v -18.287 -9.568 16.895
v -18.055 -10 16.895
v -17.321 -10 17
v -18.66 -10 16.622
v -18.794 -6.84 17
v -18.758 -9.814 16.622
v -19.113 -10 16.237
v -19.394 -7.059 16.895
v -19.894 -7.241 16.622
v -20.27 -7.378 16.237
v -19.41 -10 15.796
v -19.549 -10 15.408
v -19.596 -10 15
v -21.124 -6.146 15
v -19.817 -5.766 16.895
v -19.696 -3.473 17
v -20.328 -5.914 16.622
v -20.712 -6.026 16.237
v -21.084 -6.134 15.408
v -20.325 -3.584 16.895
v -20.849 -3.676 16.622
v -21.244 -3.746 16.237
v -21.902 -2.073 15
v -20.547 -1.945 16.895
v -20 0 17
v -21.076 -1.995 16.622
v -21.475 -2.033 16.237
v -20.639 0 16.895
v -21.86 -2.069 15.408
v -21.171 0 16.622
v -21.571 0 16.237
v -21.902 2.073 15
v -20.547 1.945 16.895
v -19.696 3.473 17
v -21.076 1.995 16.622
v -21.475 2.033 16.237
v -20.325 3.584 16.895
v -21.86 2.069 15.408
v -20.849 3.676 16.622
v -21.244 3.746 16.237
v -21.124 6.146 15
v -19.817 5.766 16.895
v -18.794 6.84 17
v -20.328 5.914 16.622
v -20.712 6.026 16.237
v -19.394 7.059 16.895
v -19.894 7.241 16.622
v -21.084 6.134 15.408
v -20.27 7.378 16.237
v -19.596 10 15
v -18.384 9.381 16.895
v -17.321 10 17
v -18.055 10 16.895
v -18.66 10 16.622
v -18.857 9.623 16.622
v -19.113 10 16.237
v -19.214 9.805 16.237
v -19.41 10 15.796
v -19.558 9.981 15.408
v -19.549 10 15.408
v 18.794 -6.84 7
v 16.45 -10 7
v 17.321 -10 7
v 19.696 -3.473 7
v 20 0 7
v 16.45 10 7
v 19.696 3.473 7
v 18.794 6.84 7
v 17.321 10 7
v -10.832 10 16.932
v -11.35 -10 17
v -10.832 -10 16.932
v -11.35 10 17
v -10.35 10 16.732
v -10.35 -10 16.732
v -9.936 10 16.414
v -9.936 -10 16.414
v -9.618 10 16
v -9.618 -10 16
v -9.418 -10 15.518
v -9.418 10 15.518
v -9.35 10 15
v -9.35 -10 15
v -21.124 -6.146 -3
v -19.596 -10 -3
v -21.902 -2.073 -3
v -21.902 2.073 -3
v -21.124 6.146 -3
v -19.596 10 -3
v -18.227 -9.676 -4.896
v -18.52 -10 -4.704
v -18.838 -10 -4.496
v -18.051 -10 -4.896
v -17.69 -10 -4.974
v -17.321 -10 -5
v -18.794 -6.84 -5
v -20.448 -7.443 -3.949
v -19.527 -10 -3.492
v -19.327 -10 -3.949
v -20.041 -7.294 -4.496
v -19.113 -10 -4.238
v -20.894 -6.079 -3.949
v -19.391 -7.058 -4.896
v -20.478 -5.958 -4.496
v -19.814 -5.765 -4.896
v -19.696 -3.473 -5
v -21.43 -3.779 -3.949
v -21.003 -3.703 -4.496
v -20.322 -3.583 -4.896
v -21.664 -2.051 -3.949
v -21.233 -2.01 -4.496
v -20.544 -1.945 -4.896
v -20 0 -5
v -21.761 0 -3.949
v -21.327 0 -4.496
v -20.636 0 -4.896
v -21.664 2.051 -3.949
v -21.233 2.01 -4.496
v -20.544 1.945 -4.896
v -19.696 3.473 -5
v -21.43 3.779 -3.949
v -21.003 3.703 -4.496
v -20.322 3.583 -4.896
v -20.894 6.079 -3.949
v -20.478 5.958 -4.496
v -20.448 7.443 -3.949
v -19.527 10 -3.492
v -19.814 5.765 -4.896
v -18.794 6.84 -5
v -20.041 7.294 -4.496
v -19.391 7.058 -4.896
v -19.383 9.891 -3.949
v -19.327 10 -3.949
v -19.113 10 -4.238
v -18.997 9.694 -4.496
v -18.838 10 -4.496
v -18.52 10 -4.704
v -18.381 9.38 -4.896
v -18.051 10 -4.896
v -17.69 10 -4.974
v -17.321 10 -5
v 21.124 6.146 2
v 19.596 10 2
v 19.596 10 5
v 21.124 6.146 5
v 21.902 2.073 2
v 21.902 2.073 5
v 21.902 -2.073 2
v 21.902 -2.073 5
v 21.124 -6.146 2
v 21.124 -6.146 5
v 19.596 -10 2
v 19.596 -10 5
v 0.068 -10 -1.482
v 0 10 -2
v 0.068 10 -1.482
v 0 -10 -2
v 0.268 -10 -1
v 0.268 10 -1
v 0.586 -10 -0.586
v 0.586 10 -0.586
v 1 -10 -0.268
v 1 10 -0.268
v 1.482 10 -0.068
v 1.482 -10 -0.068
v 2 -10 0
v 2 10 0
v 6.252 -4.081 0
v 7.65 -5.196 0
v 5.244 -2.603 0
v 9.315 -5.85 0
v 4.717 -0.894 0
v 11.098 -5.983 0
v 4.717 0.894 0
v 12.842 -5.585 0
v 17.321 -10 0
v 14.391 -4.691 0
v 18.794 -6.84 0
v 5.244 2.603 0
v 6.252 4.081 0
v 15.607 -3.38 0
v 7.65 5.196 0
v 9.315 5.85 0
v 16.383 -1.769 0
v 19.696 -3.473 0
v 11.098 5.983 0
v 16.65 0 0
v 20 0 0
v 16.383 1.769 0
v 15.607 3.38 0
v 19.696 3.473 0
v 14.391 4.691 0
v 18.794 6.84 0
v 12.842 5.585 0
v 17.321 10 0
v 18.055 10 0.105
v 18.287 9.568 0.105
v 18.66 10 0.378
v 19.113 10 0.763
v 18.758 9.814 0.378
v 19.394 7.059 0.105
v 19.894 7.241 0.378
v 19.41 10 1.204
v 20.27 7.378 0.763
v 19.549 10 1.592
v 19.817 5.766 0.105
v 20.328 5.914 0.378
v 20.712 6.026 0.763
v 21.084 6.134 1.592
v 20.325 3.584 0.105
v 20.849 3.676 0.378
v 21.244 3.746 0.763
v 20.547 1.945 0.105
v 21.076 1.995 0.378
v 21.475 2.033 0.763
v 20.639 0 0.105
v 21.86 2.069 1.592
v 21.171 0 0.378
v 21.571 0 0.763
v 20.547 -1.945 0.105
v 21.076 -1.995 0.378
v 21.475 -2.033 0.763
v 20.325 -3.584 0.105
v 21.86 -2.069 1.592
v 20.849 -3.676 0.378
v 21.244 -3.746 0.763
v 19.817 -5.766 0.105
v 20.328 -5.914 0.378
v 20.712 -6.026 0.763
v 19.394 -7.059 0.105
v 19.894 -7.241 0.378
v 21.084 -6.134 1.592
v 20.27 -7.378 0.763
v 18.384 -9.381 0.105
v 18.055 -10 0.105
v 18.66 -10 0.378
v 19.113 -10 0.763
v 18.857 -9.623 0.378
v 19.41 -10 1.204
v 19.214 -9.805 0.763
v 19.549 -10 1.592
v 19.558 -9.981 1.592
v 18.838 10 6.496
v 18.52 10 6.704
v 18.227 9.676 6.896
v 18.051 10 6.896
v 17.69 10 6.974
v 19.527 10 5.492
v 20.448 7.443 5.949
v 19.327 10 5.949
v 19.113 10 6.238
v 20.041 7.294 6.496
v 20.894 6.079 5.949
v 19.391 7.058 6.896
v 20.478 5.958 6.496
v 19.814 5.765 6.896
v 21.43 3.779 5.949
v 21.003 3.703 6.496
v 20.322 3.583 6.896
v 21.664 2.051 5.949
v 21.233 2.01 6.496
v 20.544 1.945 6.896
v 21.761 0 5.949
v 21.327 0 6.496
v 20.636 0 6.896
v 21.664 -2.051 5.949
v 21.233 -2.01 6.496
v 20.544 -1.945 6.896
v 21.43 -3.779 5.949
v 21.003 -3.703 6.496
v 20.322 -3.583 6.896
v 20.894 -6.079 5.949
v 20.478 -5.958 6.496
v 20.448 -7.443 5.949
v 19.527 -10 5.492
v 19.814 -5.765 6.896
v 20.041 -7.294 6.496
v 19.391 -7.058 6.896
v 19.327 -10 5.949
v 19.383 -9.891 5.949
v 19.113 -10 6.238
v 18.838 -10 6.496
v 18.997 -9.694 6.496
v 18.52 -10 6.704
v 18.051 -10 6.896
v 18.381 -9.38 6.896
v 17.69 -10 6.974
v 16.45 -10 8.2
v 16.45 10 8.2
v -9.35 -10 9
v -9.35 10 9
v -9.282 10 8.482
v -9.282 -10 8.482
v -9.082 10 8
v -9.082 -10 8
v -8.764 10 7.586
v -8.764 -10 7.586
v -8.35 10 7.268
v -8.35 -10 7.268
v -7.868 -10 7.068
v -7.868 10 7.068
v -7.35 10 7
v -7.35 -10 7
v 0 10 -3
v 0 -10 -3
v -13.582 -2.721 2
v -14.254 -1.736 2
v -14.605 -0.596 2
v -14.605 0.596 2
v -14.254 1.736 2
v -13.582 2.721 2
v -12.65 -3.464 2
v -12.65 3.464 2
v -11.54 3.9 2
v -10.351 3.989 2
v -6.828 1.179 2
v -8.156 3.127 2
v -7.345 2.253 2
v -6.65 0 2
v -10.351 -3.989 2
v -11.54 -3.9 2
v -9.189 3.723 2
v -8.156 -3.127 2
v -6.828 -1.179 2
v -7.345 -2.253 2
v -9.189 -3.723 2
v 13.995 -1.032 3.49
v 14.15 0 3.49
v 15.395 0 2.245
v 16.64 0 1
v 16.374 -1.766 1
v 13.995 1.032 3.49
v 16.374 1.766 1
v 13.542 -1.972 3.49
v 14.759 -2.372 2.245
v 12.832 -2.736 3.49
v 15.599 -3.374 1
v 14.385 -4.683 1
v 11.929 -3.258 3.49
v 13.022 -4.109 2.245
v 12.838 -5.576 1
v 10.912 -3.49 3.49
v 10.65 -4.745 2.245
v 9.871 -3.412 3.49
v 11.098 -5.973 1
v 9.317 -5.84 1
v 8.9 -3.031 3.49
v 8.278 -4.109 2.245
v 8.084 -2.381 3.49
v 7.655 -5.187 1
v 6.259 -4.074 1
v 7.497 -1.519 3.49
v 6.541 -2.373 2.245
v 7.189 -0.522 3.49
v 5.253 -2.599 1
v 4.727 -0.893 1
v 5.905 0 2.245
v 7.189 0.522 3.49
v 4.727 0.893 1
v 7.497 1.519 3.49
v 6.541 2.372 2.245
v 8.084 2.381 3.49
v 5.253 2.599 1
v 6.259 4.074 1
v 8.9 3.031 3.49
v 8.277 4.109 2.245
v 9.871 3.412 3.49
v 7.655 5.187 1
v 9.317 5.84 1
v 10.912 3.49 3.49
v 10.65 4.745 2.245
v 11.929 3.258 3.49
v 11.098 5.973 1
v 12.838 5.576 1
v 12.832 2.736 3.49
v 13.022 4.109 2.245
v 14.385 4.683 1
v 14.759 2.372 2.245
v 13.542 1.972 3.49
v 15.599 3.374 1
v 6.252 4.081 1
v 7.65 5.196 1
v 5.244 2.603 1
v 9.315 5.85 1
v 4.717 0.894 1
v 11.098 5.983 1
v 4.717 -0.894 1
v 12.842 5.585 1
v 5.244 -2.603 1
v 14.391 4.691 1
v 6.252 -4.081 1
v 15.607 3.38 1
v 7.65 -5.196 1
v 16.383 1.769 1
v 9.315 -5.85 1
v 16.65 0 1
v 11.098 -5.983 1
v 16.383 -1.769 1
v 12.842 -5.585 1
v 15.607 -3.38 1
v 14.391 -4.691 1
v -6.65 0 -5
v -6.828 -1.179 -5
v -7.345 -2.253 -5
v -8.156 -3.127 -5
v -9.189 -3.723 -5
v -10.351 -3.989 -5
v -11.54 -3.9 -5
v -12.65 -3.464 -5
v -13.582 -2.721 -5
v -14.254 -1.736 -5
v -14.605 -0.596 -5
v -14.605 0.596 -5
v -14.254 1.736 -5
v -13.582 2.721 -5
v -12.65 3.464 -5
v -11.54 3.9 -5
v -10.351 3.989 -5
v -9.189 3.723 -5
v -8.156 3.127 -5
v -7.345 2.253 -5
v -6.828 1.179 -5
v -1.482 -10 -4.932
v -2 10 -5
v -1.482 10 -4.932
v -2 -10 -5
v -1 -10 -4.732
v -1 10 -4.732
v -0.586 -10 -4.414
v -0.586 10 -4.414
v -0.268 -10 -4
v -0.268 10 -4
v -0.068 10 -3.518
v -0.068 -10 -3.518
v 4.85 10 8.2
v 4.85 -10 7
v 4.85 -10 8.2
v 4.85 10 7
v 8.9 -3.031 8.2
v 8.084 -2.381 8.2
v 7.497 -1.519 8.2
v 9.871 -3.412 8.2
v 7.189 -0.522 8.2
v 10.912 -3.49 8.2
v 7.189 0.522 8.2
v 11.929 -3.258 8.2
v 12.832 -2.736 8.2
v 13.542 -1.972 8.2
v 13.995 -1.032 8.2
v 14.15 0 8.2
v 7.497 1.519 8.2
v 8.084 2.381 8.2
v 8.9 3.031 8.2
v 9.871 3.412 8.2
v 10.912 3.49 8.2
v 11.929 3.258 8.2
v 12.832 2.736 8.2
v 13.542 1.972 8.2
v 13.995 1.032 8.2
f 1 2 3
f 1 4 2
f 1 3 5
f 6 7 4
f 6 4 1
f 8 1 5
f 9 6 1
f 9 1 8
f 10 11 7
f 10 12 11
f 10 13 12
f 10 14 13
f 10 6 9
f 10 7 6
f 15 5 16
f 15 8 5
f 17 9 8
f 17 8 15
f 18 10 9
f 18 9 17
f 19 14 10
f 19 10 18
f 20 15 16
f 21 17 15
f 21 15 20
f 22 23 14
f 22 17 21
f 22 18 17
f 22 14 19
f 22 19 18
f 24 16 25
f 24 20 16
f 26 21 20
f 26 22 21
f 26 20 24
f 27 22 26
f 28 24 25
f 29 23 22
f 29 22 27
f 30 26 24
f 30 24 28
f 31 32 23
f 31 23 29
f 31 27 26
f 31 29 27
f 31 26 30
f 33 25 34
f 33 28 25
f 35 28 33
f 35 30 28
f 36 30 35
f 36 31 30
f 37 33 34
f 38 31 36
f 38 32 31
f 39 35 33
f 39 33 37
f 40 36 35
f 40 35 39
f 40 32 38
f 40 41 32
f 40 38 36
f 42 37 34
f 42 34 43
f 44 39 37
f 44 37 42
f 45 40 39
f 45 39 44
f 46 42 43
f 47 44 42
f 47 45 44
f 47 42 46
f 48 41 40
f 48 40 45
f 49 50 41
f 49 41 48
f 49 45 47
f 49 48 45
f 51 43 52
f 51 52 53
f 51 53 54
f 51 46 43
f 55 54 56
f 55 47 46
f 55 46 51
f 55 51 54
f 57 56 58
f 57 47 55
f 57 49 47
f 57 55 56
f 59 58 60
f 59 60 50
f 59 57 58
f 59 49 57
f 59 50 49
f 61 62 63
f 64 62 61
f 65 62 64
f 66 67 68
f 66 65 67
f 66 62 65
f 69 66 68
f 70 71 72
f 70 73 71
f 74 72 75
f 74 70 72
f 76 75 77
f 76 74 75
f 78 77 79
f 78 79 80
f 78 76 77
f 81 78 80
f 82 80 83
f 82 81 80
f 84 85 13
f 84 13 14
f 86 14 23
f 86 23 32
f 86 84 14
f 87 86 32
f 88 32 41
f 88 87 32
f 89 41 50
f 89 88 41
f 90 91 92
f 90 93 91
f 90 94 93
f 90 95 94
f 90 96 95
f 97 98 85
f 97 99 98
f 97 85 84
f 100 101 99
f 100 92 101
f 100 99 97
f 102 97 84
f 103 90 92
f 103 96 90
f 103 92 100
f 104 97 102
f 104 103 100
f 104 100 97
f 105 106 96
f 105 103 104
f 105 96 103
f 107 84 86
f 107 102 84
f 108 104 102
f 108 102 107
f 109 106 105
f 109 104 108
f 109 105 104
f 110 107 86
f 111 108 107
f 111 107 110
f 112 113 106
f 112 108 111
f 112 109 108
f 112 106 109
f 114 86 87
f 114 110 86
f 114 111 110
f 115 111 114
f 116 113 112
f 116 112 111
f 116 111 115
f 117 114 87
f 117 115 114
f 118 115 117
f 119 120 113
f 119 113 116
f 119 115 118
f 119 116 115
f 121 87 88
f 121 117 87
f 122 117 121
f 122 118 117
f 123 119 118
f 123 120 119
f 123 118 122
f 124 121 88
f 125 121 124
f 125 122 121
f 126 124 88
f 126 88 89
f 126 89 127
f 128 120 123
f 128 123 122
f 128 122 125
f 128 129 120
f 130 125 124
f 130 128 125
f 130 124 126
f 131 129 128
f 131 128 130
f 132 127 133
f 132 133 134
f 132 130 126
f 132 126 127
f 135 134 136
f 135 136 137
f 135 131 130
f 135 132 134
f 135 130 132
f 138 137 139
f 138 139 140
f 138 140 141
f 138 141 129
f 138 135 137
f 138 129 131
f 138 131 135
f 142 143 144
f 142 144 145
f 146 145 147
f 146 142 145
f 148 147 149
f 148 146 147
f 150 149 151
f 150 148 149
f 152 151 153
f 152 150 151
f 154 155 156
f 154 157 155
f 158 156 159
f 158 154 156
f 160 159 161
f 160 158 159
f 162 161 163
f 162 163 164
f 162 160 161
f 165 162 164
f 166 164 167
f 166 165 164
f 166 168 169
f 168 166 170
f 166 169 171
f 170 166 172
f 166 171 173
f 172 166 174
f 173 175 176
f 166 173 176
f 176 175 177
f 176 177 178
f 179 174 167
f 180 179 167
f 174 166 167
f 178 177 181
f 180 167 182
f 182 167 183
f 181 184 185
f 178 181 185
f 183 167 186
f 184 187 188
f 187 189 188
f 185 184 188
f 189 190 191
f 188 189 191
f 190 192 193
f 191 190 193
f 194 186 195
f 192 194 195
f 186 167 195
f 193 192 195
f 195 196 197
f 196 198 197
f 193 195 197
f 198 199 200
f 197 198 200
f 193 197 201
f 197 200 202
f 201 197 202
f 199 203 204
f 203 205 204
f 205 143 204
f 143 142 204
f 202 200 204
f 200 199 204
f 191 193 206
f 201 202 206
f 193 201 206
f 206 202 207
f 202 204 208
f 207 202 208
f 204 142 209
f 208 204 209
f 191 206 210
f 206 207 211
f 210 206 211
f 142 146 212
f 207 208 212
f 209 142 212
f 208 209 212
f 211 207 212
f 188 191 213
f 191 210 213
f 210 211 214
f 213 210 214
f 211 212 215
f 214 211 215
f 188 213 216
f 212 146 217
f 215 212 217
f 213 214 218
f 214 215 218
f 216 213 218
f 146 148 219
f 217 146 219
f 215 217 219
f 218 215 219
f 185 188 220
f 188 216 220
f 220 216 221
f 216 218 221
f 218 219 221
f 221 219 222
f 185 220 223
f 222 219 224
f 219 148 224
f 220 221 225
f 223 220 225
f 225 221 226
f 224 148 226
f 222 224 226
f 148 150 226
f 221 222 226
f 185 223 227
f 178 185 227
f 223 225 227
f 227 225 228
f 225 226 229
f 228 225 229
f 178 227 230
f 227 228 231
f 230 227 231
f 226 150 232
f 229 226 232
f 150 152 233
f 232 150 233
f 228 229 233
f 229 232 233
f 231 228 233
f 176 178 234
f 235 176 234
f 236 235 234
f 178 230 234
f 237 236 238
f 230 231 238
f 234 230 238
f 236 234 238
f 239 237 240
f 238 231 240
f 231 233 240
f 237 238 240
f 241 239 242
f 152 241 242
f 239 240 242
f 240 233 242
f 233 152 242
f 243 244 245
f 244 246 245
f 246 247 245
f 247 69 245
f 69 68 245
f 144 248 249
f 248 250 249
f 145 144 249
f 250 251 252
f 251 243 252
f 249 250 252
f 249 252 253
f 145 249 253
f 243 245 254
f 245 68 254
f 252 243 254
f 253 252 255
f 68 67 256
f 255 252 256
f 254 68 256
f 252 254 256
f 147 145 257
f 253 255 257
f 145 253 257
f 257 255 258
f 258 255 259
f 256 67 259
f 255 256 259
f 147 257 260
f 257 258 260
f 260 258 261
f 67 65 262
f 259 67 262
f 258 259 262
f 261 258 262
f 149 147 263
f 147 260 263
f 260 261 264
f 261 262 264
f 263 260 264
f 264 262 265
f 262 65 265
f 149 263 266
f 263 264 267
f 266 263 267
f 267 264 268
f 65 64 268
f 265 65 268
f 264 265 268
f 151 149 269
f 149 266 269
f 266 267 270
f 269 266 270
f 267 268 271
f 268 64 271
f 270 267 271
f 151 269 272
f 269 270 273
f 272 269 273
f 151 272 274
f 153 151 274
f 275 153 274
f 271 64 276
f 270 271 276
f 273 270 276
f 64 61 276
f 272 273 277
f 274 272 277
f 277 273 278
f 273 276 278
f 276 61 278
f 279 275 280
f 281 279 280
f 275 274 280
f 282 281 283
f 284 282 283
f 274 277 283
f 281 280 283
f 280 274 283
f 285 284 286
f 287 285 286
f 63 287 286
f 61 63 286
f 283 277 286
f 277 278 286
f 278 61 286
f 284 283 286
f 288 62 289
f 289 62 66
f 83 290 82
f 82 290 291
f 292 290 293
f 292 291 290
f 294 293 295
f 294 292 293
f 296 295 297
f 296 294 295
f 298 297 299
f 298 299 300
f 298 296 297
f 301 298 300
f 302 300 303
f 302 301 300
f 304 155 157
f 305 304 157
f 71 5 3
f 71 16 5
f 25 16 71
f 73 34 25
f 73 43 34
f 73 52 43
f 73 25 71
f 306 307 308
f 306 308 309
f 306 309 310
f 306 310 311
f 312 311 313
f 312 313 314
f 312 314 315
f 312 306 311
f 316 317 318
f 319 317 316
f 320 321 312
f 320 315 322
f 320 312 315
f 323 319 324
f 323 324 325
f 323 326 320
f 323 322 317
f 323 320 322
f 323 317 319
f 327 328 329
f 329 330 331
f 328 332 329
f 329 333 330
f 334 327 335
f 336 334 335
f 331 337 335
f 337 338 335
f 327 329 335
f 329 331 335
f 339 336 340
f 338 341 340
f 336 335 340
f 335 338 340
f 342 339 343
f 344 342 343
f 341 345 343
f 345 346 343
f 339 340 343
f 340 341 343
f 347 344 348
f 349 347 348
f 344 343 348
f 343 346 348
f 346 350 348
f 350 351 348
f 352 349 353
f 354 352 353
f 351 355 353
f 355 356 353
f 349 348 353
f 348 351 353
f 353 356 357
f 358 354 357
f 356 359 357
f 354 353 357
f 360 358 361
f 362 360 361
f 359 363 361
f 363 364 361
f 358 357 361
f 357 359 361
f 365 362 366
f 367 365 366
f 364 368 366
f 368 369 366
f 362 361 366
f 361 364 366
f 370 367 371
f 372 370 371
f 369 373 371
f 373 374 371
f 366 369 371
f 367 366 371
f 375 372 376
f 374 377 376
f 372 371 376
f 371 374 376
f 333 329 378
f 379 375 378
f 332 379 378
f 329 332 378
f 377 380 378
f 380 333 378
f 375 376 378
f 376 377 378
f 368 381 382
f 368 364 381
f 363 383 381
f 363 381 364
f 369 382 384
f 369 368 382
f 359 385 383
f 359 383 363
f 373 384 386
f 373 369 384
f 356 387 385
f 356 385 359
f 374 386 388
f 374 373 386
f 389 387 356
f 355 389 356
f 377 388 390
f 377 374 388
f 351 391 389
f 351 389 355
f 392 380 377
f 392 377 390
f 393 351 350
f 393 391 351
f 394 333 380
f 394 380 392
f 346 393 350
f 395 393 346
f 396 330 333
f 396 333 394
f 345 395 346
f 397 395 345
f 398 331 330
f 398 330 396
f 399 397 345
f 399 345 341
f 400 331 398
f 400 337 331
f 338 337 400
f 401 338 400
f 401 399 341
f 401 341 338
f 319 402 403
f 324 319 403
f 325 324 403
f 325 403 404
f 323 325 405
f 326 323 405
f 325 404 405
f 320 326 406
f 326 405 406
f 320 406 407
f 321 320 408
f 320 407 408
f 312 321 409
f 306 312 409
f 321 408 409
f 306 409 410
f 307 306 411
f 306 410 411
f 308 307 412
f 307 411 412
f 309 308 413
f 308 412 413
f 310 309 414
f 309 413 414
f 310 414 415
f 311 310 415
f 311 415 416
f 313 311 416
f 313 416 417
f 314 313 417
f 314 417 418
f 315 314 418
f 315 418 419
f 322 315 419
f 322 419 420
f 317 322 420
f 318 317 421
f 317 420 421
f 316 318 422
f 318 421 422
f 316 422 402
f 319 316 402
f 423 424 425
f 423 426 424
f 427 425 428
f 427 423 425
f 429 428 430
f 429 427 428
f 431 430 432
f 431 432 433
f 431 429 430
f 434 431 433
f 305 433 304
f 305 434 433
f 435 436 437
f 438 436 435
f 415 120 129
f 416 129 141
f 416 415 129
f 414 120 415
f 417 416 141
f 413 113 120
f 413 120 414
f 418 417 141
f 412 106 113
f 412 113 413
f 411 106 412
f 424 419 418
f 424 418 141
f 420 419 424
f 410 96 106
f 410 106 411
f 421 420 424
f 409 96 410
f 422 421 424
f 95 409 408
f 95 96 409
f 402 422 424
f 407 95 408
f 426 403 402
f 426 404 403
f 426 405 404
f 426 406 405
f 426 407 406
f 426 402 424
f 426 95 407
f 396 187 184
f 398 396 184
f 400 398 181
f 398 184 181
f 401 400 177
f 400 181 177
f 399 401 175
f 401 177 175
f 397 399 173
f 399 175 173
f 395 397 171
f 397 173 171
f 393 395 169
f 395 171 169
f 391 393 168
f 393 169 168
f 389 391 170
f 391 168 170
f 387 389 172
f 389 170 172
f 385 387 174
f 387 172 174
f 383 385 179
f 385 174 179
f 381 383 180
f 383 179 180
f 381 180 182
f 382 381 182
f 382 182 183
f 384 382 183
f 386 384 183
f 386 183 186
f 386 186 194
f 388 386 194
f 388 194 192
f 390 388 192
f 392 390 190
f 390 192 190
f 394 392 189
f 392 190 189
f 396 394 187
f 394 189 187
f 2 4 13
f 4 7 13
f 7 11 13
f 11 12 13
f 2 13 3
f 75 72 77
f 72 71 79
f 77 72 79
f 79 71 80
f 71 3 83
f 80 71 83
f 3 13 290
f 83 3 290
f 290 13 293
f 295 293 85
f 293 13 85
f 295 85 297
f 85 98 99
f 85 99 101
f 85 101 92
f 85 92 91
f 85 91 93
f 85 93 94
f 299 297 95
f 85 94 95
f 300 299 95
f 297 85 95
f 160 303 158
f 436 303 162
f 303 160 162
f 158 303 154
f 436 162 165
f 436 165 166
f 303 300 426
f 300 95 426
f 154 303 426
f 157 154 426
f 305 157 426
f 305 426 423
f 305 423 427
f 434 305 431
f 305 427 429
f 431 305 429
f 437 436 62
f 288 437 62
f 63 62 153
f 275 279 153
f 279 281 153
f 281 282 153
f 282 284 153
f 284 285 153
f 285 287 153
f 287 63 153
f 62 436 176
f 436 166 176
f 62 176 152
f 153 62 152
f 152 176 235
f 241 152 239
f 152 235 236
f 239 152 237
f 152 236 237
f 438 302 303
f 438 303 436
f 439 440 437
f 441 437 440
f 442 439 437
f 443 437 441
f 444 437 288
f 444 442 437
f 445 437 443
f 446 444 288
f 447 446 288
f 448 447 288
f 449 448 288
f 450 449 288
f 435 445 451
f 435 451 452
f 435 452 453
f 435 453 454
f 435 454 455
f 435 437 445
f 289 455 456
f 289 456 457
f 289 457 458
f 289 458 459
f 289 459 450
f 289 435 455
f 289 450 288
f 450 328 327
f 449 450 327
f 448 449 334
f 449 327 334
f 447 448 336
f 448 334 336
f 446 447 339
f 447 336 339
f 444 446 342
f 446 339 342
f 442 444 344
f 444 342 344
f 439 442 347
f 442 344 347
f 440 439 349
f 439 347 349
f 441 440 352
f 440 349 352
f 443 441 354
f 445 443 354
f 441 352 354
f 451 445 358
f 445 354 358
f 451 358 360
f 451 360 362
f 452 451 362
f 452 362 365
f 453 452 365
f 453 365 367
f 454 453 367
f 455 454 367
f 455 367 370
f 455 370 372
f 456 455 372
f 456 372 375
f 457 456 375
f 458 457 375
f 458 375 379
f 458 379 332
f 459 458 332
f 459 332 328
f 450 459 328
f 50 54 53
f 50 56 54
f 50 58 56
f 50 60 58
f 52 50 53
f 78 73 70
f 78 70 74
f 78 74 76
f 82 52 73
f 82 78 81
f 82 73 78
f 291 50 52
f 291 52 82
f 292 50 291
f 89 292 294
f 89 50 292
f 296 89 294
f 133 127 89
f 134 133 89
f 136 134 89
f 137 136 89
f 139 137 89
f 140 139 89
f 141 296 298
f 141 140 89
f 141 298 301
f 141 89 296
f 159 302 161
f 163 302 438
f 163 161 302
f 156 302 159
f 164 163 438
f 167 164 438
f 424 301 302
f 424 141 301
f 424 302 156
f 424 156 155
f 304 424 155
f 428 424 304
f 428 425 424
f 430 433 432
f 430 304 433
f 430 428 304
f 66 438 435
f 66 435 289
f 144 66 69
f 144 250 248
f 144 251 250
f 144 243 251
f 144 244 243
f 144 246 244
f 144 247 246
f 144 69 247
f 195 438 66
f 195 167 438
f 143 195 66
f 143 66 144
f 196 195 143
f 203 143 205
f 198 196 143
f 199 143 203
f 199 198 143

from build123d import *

# Parameters (mm, degrees)
SKETCH_W        = 50
SKETCH_H        = 20
PAD_DEPTH       = 7
SKETCH001_W     = 11.6
SKETCH001_H     = 20
PAD001_DEPTH    = 1.2
SKETCH002_R     = 3.5
POCKET_DEPTH    = 8.201
SKETCH003_R     = 6
POCKET001_DEPTH = 1
CHAMFER_SIZE    = 2.49
SKETCH004_W     = 25
SKETCH004_H     = 20
PAD002_DEPTH    = 5
SKETCH005_R     = 4
POCKET002_DEPTH = 7
SKETCH006_W     = 15.65
SKETCH006_H     = 20
PAD003_DEPTH    = 10
POCKET003_DEPTH = 22.001
FILLET_R        = 2


with BuildPart() as part:
    # Sketch → Pad (new body)
    with BuildSketch(Plane.XY):
        Rectangle(SKETCH_W, SKETCH_H)
    extrude(amount=PAD_DEPTH)

    # Sketch001 (on Face6 of Pad) → Pad001 (join)
    with BuildSketch(Plane.XY.offset(7)):
        with Locations((10.65, 0)):
            Rectangle(SKETCH001_W, SKETCH001_H)
    extrude(amount=PAD001_DEPTH)

    # Sketch002 (on Face4 of Pad001) → Pocket (cut, through all)
    with BuildSketch(Plane(origin=(0, 0, 0), x_dir=(1, 0, 0), z_dir=(0, 0, -1))):
        with Locations((10.65, 0)):
            Circle(SKETCH002_R)
    extrude(amount=-POCKET_DEPTH, mode=Mode.SUBTRACT)

    # Sketch003 (on Face4 of Pocket) → Pocket001 (cut)
    with BuildSketch(Plane(origin=(0, 0, 0), x_dir=(1, 0, 0), z_dir=(0, 0, -1))):
        with Locations((10.65, 0)):
            Circle(SKETCH003_R)
    extrude(amount=-POCKET001_DEPTH, mode=Mode.SUBTRACT)

    # Chamfer
    chamfer_edges = [part.edges().sort_by_distance(p)[0] for p in [
        (7.15, 0, 1),
    ]]
    chamfer(chamfer_edges, length=CHAMFER_SIZE)

    # Sketch004 (on Face5 of Chamfer) → Pad002 (join)
    with BuildSketch(Plane(origin=(0, 0, 0), x_dir=(1, 0, 0), z_dir=(0, 0, -1))):
        with Locations((-12.5, 0)):
            Rectangle(SKETCH004_W, SKETCH004_H)
    extrude(amount=PAD002_DEPTH)

    # Sketch005 (on Face16 of Pad002) → Pocket002 (cut)
    with BuildSketch(Plane(origin=(0, 0, -5), x_dir=(1, 0, 0), z_dir=(0, 0, -1))):
        with Locations((-10.65, 0)):
            Circle(SKETCH005_R)
    extrude(amount=-POCKET002_DEPTH, mode=Mode.SUBTRACT)

    # Sketch006 (on Face20 of Pocket002) → Pad003 (join)
    with BuildSketch(Plane.XY.offset(7)):
        with Locations((-17.175, 0)):
            Rectangle(SKETCH006_W, SKETCH006_H)
    extrude(amount=PAD003_DEPTH)

    # Sketch007 (on Face16 of Pad003) → Pocket003 (cut, through all)
    with BuildSketch(Plane(origin=(0, 0, -5), x_dir=(1, 0, 0), z_dir=(0, 0, -1))):
        with BuildLine():
            ThreePointArc((-19.595918, 10), (-22, 0), (-19.595918, -10))
            Line((-19.595918, -10), (-25, -10))
            Line((-25, -10), (-25, 10))
            Line((-25, 10), (-19.595918, 10))
        make_face()
        with BuildLine():
            ThreePointArc((19.595918, -10), (22, 0), (19.595918, 10))
            Line((19.595918, 10), (25, 10))
            Line((25, 10), (25, -10))
            Line((25, -10), (19.595918, -10))
        make_face()
    extrude(amount=-POCKET003_DEPTH, mode=Mode.SUBTRACT)

    # Fillet
    fillet_edges = [part.edges().sort_by_distance(p)[0] for p in [
        (-22, 0, -5),
        (0, 0, -5),
        (0, 0, 0),
        (22, 0, 0),
        (22, 0, 7),
        (-9.35, 0, 17),
        (-22, 0, 17),
        (-9.35, 0, 7),
    ]]
    fillet(fillet_edges, radius=FILLET_R)


solid = part.part
